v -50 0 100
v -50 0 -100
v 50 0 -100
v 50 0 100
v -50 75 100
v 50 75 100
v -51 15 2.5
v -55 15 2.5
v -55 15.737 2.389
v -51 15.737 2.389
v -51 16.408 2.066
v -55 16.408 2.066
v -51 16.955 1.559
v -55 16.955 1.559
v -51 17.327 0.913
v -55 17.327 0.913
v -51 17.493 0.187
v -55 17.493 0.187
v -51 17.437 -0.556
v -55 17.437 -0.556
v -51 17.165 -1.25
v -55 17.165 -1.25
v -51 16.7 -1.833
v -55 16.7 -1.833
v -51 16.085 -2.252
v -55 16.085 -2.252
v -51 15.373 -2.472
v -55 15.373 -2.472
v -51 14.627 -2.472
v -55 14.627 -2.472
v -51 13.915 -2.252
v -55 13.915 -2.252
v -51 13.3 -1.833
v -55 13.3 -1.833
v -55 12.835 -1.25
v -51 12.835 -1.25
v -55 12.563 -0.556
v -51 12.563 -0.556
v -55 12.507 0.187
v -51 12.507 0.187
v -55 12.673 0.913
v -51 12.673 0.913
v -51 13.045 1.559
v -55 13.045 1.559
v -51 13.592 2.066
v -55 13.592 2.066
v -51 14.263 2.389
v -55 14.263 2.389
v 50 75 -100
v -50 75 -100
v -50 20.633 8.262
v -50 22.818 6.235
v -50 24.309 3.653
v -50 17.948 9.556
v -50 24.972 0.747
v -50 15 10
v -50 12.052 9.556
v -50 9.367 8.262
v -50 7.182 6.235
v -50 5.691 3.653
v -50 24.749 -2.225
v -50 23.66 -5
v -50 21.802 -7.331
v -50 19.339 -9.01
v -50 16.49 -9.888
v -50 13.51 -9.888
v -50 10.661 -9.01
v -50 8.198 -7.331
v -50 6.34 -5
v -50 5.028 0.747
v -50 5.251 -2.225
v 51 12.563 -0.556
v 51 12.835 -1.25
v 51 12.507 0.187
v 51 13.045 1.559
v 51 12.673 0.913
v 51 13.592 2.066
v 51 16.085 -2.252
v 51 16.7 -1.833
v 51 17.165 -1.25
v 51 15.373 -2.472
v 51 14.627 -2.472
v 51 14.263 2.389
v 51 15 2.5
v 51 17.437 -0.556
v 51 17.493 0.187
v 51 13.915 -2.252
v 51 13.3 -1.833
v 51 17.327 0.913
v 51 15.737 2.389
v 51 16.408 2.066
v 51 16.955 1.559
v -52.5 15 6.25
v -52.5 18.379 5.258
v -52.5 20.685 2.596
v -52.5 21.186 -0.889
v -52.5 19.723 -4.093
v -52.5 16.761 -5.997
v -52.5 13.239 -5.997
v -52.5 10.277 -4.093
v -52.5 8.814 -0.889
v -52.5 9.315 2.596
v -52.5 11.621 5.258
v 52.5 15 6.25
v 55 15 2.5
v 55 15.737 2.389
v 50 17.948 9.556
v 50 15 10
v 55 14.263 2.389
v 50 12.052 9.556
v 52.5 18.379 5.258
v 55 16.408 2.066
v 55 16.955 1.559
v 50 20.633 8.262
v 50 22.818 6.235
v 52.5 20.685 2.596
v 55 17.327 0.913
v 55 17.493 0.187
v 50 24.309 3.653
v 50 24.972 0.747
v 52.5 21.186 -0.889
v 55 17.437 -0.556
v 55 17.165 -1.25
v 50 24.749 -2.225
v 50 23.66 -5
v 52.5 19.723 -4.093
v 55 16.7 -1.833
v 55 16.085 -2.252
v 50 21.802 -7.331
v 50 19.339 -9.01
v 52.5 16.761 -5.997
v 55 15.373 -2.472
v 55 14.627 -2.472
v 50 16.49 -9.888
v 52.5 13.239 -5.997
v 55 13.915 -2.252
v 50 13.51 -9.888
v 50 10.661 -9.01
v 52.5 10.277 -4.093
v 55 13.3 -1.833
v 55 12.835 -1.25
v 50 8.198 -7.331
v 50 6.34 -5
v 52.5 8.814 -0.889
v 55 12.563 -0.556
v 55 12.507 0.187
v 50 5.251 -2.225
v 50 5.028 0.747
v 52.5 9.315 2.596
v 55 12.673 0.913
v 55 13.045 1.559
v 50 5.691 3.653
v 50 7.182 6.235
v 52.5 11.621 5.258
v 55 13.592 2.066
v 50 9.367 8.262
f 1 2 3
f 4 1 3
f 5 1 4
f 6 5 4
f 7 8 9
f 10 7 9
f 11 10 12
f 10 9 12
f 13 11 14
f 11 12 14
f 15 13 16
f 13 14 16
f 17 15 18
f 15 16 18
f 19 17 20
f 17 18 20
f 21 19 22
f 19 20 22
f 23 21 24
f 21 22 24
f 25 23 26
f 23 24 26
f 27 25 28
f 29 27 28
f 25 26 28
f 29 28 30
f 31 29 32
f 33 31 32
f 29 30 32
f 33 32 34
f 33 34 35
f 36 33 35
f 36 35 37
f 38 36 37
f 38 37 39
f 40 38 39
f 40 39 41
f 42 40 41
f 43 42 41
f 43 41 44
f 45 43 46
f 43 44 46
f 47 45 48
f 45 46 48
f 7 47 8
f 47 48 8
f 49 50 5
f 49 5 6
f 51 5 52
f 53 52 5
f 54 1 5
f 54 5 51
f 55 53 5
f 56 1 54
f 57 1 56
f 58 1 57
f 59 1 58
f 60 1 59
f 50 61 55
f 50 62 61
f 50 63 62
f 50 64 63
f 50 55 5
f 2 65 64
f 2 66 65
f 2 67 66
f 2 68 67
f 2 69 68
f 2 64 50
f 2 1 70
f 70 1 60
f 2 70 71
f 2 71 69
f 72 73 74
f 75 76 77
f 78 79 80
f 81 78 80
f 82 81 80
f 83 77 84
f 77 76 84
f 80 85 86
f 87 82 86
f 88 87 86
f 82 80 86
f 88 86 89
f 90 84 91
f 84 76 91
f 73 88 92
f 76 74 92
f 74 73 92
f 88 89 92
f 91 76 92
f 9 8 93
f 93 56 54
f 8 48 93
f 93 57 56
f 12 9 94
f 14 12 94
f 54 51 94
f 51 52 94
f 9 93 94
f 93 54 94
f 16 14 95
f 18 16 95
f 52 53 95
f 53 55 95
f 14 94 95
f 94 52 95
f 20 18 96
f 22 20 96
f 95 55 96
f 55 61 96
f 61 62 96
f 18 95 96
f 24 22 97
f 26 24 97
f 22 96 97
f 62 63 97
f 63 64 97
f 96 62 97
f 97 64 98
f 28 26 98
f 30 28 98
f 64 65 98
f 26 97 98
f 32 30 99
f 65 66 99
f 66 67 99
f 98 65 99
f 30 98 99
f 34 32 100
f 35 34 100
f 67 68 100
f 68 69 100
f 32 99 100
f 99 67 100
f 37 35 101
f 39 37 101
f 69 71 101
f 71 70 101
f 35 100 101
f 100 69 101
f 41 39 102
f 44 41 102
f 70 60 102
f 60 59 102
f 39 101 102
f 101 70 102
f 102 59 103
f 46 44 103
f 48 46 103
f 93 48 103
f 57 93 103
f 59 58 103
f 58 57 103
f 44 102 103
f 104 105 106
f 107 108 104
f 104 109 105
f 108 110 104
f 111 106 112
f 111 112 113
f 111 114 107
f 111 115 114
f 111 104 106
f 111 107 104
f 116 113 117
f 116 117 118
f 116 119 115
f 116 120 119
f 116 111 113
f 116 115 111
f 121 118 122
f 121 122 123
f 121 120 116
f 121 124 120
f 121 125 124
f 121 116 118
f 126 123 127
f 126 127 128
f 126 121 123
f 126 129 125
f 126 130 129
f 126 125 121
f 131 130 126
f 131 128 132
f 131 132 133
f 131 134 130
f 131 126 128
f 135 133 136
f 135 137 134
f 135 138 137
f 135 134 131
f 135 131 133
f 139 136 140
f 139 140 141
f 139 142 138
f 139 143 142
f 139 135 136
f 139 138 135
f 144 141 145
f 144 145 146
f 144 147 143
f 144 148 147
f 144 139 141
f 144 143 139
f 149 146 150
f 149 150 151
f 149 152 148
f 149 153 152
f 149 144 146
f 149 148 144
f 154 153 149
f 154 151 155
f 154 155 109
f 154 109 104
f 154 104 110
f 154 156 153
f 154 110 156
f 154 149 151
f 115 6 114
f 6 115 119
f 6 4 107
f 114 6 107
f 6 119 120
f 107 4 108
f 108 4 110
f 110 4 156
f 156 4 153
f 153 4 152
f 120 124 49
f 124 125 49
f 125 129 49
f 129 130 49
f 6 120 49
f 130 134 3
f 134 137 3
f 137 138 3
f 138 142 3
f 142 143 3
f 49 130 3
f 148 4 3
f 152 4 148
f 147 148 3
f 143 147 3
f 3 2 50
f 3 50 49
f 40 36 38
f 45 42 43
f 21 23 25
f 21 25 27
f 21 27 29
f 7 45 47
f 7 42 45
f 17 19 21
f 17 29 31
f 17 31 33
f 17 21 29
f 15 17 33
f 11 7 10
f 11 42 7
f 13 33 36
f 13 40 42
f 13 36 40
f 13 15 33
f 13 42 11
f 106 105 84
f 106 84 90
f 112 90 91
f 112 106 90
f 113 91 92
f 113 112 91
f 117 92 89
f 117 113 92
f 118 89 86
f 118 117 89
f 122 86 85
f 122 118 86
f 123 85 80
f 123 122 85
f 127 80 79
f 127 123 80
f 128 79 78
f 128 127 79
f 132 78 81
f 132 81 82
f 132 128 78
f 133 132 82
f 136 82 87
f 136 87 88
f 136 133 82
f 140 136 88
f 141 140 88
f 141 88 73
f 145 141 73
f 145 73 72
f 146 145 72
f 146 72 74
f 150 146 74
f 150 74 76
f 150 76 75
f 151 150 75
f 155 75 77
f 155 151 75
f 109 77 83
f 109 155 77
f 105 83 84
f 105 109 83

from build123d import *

# Parameters (mm, degrees)
SKETCH2_W           = 100
SKETCH2_H           = 200
BOSS_EXTRUDE1_DEPTH = 75
SKETCH5_R           = 2.5
SKETCH3_R           = 10
SKETCH6_R           = 2.5
CUT_EXTRUDE1_DEPTH  = 4


with BuildPart() as part:
    # Sketch2 → Boss-Extrude1 (new body)
    with BuildSketch(Plane(origin=(0, 0, 0), x_dir=(1, 0, 0), z_dir=(0, 1, 0))):
        Rectangle(SKETCH2_W, SKETCH2_H)
    extrude(amount=BOSS_EXTRUDE1_DEPTH)

    # Sketch5 → Loft1 section 0
    with BuildSketch(Plane.ZY.offset(55)):
        with Locations((0, 15)):
            Circle(SKETCH5_R)
    # Sketch3 → Loft1 section 1
    with BuildSketch(Plane.ZY.offset(50)):
        with Locations((0, 15)):
            Circle(SKETCH3_R)
    loft1 = loft()

    # Sketch6 → Cut-Extrude1 (cut)
    with BuildSketch(Plane.ZY.offset(55)):
        with Locations((0, 15)):
            Circle(SKETCH6_R)
    cut_extrude1 = extrude(amount=-CUT_EXTRUDE1_DEPTH, mode=Mode.SUBTRACT)

    # Mirror1: Loft1, Cut-Extrude1 across plane
    add(loft1.mirror(Plane(origin=(0, 0, 0), x_dir=(0, 0, 1), z_dir=(1, 0, 0))))
    add(cut_extrude1.mirror(Plane(origin=(0, 0, 0), x_dir=(0, 0, 1), z_dir=(1, 0, 0))), mode=Mode.SUBTRACT)


solid = part.part
